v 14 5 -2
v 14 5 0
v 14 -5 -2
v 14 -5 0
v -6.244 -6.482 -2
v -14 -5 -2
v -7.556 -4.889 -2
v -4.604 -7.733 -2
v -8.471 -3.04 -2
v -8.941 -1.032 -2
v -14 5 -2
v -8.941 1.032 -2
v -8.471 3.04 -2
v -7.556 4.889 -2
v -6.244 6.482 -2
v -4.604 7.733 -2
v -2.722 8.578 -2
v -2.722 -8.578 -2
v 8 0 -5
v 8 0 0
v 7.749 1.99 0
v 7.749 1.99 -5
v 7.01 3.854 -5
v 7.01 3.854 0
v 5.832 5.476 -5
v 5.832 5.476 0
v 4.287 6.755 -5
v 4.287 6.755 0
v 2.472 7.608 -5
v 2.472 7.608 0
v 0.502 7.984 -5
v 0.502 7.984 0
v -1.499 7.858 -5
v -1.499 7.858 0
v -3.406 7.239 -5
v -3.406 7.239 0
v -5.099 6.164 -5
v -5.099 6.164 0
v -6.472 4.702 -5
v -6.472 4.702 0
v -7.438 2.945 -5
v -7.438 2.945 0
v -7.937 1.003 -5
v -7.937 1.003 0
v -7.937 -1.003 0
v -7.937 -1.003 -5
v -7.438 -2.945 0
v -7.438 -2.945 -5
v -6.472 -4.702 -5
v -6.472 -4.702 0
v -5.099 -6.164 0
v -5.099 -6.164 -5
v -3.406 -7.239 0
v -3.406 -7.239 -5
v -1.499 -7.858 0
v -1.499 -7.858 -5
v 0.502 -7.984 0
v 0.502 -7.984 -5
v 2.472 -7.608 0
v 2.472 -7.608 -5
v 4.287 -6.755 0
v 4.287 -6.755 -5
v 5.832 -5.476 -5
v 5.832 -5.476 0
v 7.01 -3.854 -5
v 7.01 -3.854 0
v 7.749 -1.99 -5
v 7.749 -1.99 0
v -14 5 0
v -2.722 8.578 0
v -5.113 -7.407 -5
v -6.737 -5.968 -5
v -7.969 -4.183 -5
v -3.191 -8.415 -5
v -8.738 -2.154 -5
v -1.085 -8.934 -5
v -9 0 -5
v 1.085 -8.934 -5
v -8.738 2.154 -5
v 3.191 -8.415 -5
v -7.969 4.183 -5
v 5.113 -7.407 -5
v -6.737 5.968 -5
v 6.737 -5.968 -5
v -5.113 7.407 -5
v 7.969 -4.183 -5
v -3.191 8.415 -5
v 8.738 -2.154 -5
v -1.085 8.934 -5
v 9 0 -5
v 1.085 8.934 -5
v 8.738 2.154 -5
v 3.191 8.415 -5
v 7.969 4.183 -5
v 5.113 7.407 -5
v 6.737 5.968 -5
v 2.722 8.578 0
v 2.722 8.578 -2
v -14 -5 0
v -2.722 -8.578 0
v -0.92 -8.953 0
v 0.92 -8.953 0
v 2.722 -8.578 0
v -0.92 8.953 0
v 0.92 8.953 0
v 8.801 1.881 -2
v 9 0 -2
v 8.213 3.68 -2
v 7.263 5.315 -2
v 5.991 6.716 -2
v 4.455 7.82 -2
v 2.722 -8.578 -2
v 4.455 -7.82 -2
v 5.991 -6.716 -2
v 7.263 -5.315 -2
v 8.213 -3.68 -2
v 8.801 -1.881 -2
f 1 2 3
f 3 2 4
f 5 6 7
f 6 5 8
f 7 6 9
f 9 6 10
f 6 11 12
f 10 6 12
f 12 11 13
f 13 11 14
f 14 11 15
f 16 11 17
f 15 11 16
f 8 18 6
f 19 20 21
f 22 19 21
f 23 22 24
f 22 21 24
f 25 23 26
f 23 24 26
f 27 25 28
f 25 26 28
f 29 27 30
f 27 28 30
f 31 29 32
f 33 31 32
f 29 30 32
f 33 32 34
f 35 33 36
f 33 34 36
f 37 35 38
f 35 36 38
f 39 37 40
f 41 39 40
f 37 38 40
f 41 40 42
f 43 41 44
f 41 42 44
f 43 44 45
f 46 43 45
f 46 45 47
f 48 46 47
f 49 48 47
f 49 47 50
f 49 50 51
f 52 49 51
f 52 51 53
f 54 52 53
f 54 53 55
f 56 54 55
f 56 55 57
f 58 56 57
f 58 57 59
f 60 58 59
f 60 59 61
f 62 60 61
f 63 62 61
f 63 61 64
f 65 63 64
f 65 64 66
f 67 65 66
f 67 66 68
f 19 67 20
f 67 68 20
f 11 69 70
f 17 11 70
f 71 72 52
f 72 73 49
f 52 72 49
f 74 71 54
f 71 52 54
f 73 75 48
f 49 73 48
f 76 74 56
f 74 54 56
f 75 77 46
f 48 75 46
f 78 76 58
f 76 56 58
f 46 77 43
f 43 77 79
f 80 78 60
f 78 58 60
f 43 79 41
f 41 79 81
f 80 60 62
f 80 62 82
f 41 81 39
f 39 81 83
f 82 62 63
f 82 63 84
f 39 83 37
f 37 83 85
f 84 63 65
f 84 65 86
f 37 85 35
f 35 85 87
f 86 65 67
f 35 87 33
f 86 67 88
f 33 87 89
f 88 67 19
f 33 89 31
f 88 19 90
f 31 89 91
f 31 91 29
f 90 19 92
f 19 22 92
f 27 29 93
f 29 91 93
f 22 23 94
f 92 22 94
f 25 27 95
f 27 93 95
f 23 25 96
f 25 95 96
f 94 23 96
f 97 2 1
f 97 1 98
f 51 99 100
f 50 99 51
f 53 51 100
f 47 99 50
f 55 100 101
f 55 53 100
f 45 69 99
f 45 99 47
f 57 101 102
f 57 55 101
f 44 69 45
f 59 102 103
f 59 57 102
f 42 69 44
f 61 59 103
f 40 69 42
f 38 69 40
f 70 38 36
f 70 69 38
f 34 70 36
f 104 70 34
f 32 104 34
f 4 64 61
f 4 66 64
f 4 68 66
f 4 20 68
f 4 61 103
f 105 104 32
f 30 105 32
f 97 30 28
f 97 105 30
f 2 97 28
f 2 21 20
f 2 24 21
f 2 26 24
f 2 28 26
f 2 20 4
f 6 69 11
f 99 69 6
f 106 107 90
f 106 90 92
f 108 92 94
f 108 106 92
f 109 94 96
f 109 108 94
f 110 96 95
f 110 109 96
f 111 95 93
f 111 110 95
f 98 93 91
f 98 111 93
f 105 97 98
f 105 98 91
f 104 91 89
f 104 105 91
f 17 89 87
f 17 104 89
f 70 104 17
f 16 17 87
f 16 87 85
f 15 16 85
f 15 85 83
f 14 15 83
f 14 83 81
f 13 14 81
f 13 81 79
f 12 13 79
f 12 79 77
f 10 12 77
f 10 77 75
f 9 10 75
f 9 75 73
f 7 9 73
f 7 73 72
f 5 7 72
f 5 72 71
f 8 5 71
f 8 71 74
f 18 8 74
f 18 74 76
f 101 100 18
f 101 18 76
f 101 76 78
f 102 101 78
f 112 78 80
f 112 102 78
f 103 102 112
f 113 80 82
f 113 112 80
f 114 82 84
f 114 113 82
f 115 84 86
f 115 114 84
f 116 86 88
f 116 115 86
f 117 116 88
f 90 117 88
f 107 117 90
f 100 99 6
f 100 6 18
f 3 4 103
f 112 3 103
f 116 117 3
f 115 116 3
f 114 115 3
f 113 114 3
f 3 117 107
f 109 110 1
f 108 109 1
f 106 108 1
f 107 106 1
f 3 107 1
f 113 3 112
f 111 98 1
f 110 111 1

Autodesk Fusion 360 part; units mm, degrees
sketch "スケッチ1" plane through (0, 0, 0) normal (0, 0, 1) x (1, 0, 0)
  circle A0 centre (0, 0) radius 10.5
  circle A1 centre (0, 0) radius 9.5
  circle A2 centre (0, 0) radius 9
  circle A3 centre (0, 0) radius 8
  dimension "d1" = 21
  dimension "d2" = 19
  dimension "d3" = 18
  dimension "d4" = 16
extrude "押し出し1" add sketch "スケッチ1" along normal blind 6 contours A0 makes body 1
extrude "押し出し2" add sketch "スケッチ1" along normal blind 6 separate body contours A2 makes body 2
sketch "スケッチ2" plane through (0, 0, 6) normal (0, 0, 1) x (-1, 0, 0)
  circle A0 centre (0, 0) radius 9.5
  circle A1 centre (0, 0) radius 10.5
  line L0 (2, -15) -> (-2, -15)
  line L1 (-2, -15) -> (-8.4577, -6.2223)
  line L2 (2, -15) -> (8.4577, -6.2223)
  line L3 (0, 0) -> (-3.4838, 0)
  line L4 (2, 15) -> (8.4577, 6.2223)
  line L5 (2, 15) -> (-2, 15)
  line L6 (-2, 15) -> (-8.4577, 6.2223)
extrude "押し出し3" add sketch "スケッチ2" against normal blind 2 contours A1 L4 L5 L6 | A1 L0 L1 L2 bodies 1
sketch "スケッチ3" plane through (0, 0, 6) normal (0, 0, 1) x (-1, 0, 0)
  circle A0 centre (0, 0) radius 8
  circle A1 centre (0, 0) radius 9
  line L0 (-15, -2) -> (-15, 2)
  line L1 (-15, 2) -> (-4.3494, 7.8792)
  line L2 (-15, 0) -> (-12.4057, 0)
  line L3 (-15, -2) -> (-4.3494, -7.8792)
  line L4 (0, 0) -> (0, -2)
  line L5 (15, -2) -> (4.3494, -7.8792)
  line L6 (15, -2) -> (15, 2)
  line L7 (15, 2) -> (4.3494, 7.8792)
extrude "押し出し4" add sketch "スケッチ3" along normal blind 2 separate body makes body 3
combine "結合1" operation add target body 3 tool bodies 2
sketch "スケッチ1 (2)" plane through (0, 0, 0) normal (0, 0, 1) x (1, 0, 0) in component "Component'"
  circle A0 centre (0, 0) radius 11.25
  circle A1 centre (0, 0) radius 9.75
  line L0 (-2.095, 15.0718) -> (2.1708, 15.0718)
  line L1 (2.1708, 15.0718) -> (8.6891, 7.1458)
  line L2 (-2.095, 15.0718) -> (-8.6482, 7.1952)
  line L3 (-5.0595, -20.013) -> (5.0595, -20.013)
  line L4 (5.0595, -20.013) -> (10.6475, -3.6322)
  line L5 (-5.0595, -20.013) -> (-10.6475, -3.6322)
  dimension "d13" = 22.5
  dimension "d14" = 19.5
extrude "押し出し1'" add sketch "スケッチ1 (2)" against normal blind 2 separate body makes body 4 in component "Component'"
extrude "押し出し2'" add sketch "スケッチ1 (2)" against normal blind 5 contours A0 bodies 4 in component "Component'"
sketch "スケッチ2 (2)" plane through (0, 0, 0) normal (0, 0, 1) x (1, 0, 0) in component "Component'"
  circle A0 centre (0, 0) radius 9
  circle A1 centre (0, 0) radius 8
  line L0 (14, 5) -> (14, -5)
  line L1 (14, -5) -> (2.722, -8.5785)
  line L2 (14, 5) -> (2.722, 8.5785)
  line L3 (0, 2) -> (0, 4)
  line L4 (-14, 5) -> (-14, -5)
  line L5 (-14, 5) -> (-2.722, 8.5785)
  line L6 (-14, -5) -> (-2.722, -8.5785)
  dimension "d19" = 18
  dimension "d20" = 16
extrude "押し出し3'" add sketch "スケッチ2 (2)" against normal blind 5 separate body contours A0 makes body 5 in component "Component'"
extrude "押し出し4'" add sketch "スケッチ2 (2)" against normal blind 2 contours A0 L0 L1 L2 | A0 L4 L5 L6 bodies 5 in component "Component'"
component "Component'" placed x (1, 0, 0) y (0, 1, 0) z (0, 0, 1) at (0, 0, 0)
hidden bodies 1 3 4
